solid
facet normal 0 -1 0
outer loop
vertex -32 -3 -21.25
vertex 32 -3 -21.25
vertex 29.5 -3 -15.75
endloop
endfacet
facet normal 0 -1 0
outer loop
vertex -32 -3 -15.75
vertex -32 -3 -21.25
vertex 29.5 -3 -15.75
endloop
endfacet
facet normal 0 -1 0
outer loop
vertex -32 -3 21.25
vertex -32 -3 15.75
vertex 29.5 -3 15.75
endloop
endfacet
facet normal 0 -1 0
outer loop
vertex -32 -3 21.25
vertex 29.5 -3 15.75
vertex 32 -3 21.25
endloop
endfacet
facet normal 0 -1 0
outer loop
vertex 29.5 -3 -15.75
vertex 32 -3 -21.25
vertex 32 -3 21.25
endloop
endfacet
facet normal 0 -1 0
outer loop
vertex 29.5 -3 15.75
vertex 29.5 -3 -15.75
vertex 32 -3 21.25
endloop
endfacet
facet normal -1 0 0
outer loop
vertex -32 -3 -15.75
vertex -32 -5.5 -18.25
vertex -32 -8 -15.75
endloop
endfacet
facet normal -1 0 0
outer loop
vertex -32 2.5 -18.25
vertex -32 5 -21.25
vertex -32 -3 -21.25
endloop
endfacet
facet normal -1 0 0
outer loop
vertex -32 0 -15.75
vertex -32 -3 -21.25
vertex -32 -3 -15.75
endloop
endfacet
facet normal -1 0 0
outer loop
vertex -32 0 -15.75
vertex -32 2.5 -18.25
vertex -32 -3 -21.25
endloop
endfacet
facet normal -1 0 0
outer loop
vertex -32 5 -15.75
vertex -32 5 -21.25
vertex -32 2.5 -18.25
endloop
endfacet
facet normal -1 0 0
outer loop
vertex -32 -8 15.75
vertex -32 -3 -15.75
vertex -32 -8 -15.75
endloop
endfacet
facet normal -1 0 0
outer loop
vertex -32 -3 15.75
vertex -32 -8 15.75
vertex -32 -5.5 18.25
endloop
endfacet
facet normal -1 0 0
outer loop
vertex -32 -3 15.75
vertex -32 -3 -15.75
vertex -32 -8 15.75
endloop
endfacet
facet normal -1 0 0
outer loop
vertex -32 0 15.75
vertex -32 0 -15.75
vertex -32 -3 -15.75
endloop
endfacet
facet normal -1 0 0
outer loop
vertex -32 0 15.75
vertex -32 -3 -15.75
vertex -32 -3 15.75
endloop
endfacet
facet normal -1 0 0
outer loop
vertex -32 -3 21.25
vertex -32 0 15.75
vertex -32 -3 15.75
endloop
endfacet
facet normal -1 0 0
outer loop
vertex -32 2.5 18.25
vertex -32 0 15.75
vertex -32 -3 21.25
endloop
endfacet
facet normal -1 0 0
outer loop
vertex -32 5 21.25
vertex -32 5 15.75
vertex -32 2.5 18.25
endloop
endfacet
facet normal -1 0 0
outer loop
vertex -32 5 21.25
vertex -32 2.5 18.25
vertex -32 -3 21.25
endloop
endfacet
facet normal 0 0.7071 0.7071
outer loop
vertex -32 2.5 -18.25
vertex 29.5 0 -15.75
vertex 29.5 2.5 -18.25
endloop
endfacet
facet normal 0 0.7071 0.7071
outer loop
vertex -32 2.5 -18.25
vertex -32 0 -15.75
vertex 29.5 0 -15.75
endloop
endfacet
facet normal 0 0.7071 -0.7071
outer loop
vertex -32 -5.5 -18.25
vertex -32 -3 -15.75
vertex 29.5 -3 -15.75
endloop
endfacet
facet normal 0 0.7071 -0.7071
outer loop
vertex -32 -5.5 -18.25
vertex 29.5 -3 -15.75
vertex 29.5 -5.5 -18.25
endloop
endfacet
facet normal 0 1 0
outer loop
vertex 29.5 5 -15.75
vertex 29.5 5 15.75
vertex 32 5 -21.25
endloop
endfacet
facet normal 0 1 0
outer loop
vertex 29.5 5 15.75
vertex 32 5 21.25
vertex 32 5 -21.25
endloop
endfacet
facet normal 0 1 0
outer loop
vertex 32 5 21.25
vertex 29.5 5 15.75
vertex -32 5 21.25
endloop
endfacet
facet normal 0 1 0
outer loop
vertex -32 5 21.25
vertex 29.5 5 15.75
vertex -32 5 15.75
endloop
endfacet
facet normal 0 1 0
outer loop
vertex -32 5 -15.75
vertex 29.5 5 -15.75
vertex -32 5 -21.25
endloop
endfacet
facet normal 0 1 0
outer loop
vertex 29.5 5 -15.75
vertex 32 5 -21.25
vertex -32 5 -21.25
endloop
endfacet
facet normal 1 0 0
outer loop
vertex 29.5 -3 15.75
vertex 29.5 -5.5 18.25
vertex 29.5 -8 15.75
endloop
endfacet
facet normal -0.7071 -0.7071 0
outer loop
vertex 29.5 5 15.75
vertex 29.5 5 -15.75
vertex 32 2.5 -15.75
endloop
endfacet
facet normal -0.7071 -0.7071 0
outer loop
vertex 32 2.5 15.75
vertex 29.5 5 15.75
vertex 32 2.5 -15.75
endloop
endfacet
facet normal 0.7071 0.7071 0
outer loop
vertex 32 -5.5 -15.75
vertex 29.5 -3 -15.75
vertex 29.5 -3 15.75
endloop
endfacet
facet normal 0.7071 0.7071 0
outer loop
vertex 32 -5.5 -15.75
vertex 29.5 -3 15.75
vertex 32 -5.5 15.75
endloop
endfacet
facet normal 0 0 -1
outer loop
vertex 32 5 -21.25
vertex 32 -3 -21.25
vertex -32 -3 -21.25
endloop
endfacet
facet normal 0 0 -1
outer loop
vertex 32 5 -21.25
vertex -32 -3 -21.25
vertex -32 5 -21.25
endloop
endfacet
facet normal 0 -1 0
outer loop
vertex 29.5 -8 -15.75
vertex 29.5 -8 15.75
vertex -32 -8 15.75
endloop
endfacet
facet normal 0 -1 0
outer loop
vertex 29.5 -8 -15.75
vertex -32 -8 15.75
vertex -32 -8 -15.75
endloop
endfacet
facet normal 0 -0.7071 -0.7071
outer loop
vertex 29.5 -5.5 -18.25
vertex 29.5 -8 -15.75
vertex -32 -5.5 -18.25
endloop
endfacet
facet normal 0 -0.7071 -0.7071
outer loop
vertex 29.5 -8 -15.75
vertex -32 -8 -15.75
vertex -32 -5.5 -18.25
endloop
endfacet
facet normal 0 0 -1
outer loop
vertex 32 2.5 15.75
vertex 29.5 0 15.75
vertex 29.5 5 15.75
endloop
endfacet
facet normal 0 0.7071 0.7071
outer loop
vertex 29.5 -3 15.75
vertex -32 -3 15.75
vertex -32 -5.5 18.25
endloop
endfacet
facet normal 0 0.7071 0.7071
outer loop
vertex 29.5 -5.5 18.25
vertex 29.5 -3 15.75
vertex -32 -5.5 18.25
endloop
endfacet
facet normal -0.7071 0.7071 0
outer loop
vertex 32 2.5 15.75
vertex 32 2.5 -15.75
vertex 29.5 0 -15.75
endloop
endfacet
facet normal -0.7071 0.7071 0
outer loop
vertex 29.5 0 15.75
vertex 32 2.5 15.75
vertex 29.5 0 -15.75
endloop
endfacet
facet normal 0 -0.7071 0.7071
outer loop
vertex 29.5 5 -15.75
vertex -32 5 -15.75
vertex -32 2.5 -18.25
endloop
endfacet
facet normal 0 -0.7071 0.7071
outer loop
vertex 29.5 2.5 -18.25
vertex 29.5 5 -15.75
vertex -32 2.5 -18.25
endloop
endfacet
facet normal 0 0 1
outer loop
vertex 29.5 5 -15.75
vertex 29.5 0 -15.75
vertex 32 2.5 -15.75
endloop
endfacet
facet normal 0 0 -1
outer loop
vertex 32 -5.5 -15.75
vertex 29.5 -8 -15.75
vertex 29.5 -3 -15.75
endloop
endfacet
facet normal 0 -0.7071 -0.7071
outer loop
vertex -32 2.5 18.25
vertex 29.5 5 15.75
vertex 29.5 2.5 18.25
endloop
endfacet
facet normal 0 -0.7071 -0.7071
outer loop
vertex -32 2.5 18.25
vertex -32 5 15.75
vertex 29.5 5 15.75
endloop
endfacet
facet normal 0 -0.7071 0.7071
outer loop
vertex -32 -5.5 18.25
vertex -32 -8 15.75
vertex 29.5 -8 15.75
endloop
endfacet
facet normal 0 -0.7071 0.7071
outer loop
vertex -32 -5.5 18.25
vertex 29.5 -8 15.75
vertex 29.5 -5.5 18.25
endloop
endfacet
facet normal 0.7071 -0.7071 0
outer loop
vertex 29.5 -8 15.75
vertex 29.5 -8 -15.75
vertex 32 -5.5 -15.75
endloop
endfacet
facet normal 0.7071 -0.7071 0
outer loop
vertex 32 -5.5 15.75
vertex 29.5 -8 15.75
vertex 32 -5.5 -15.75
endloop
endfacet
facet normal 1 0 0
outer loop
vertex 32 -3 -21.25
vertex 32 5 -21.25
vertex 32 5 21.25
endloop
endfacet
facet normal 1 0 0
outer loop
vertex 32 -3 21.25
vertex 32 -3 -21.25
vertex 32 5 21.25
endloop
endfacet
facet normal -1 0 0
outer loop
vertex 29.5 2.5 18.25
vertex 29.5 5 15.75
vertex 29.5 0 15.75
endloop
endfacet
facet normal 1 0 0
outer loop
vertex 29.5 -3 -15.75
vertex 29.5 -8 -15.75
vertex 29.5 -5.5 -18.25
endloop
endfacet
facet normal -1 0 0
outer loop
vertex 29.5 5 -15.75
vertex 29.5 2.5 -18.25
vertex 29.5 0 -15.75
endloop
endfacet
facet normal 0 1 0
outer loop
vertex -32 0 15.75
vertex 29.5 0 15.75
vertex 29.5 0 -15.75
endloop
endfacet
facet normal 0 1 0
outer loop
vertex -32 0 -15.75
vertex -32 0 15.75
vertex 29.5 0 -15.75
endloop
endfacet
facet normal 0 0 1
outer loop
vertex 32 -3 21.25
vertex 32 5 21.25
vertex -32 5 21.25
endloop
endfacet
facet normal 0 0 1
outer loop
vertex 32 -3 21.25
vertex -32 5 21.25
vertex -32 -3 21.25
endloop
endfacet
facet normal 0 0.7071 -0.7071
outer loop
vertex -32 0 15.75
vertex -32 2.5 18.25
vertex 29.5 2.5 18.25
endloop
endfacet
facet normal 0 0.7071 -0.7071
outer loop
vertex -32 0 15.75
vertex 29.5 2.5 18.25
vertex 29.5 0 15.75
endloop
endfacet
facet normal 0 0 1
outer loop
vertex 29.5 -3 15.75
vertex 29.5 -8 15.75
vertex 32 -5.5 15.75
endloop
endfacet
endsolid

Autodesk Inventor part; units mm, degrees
ref_plane "YZ Plane" through (0, 0, 0) normal (1, 0, 0) x (0, 1, 0)
ref_plane "XZ Plane" through (0, 0, 0) normal (0, 1, 0) x (-1, 0, 0)
sketch "Sketch5" plane through (0, 0, 0) normal (0, 0, 1) x (1, 0, 0)
  line L0 (-32, -5) -> (32, -5)
  line L1 (32, -5) -> (32, 5)
  line L2 (32, 5) -> (-32, 5)
  line L3 (-32, 5) -> (-32, -5)
  line L4 (-32, -5) -> (32, 5) construction
  line L5 (32, -5) -> (-32, 5) construction
  point P0 (0, 0)
  dimension "d17" = 64
  dimension "d18" = 10
extrude "Extrusion5" add sketch "Sketch5" along normal mid plane 46.5
ref_plane "Work Plane2" through (0, 0, 15.75) normal (0, 0, 1) x (1, 0, 0)
sketch "Sketch7" plane through (0, 0, 15.75) normal (0, 0, 1) x (1, 0, 0)
  line L0 (32, 5) -> (-32, 5) projected
  line L1 (-32, 5) -> (-32, -5) projected
  line L2 (-32, -5) -> (32, -5) projected
  line L3 (32, -5) -> (32, 5) projected
  line L4 (32, -5) -> (32, 5) projected
  line L5 (-32, -5) -> (32, -5) projected
  line L6 (32, 5) -> (-32, 5) projected
  line L7 (29.5, 5) -> (29.5, 0)
  line L8 (29.5, 5) -> (32, 2.5)
  line L9 (32, 2.5) -> (29.5, 0)
  point P0 (0, 0)
extrude "Extrusion6" cut sketch "Sketch7" against normal blind 31.5 contours L8 L9 L7
sketch "Sketch8" plane through (-32, -5, 23.25) normal (-1, 0, 0) x (0, 0, 1)
  line L0 (-46.5, 10) -> (0, 10) projected
  line L1 (-46.5, 10) -> (-41.5, 10)
  line L2 (-41.5, 0) -> (-46.5, 0)
  line L3 (-46.5, 5) -> (-46.5, 10)
  line L4 (0, 10) -> (-5, 10)
  line L5 (-46.5, 0) -> (-46.5, 10) projected
  line L6 (-41.5, 10) -> (-39, 10)
  line L7 (-39, 10) -> (-41.5, 7.5)
  line L8 (-39, 7.5) -> (-39, 5) projected
  line L9 (-39, 5) -> (-41.5, 7.5)
  line L10 (-5, 10) -> (-7.5, 10)
  line L11 (-7.5, 10) -> (-5, 7.5)
  line L12 (-7.5, 5) -> (-7.5, 7.5) projected
  line L13 (-5, 7.5) -> (-7.5, 5)
  line L14 (-7.5, 5) -> (-39, 5)
  line L15 (-39, 10) -> (-39, 7.5) projected
  line L16 (-7.5, 7.5) -> (-7.5, 10) projected
  line L17 (-39, 10) -> (-7.5, 10)
  line L18 (-39, 10) -> (-7.5, 10)
  line L19 (-7.5, 5) -> (-39, 5) projected
  line L20 (-39, 5) -> (-7.5, 5)
  point P0 (-23.25, 5)
extrude "Extrusion8" cut sketch "Sketch8" against normal blind 61.5
sketch "Sketch9" plane through (-32, -5, -23.25) normal (-1, 0, 0) x (0, 0, 1)
  line L0 (0, 10) -> (46.5, 10) projected
  line L1 (0, 10) -> (2, 10)
  line L2 (2, 10) -> (2, 0)
  line L3 (2, 0) -> (0, 0)
  line L4 (0, 0) -> (0, 10)
  line L5 (46.5, 10) -> (44.5, 10)
  line L6 (44.5, 10) -> (44.5, 0)
  line L7 (44.5, 0) -> (46.5, 0)
  line L8 (46.5, 0) -> (46.5, 10)
  point P0 (23.25, 5)
  dimension "d37" = 2
  dimension "d38" = 2
extrude "Extrusion9" cut sketch "Sketch9" against normal through all
sketch "Sketch10" plane through (-32, 0, -15.75) normal (-1, 0, 0) x (0, 0, 1)
  line L0 (-5.5, -5) -> (-5.5, 5) projected
  line L1 (37, 5) -> (37, -5) projected
  line L2 (-5.5, -5) -> (37, -5)
  line L3 (37, -5) -> (37, -8)
  line L4 (37, -8) -> (-5.5, -8)
  line L5 (-5.5, -8) -> (-5.5, -5)
  point P0 (15.75, 0)
  dimension "d70" = 3
sketch "Sketch12" plane through (-32, 0, -15.75) normal (-1, 0, 0) x (0, 0, 1)
  line L0 (37, -3) -> (42, -3)
  line L1 (42, -3) -> (42, 5)
  line L2 (42, 5) -> (37, 5)
  line L3 (37, 5) -> (37, -3)
  point P0 (15.75, 0)
  dimension "d56" = 5
  dimension "d59" = 8
revolve "Revolution1" [suppressed]
sketch "Sketch13" plane through (-32, -3, 21.25) normal (-1, 0, 0) x (0, 0, 1)
  line L0 (5, 8) -> (0, 8) projected
  line L1 (0, 8) -> (0, 0) projected
  line L2 (0, 0) -> (5, 0) projected
  line L3 (5, 0) -> (5, 8) projected
  line L4 (5, 0) -> (5, 8) projected
  line L5 (5, 4) -> (4, 4)
  point P0 (-21.25, 3)
  dimension "d58" = 1
feature "Snap Fit2" [suppressed]
mirror "Mirror1" [suppressed]
extrude "Extrusion11" add sketch "Sketch10" against normal blind 64
sketch "Sketch14" plane through (-32, 0, -15.75) normal (-1, 0, 0) x (0, 0, 1)
  line L0 (37, -8) -> (37, 5) projected
  line L1 (31.5, 5) -> (37, 5) projected
  line L2 (31.5, 5) -> (34, 2.5) projected
  line L3 (34, 2.5) -> (31.5, 0) projected
  line L4 (31.5, 0) -> (0, 0) projected
  line L5 (0, 0) -> (-2.5, 2.5) projected
  line L6 (-2.5, 2.5) -> (0, 5) projected
  line L7 (-5.5, 5) -> (0, 5) projected
  line L8 (-5.5, 5) -> (-5.5, -8) projected
  line L9 (-5.5, -8) -> (37, -8) projected
  line L10 (-5.5, -8) -> (37, -8) projected
  line L11 (0, -3) -> (-2.5, -5.5)
  line L12 (0, -8) -> (-2.5, -5.5)
  line L13 (0, -8) -> (-5.5, -8)
  line L14 (-5.5, 5) -> (-5.5, -8) projected
  line L15 (-5.5, 0) -> (-5, 0)
  line L16 (-5.5, -3) -> (-5.5, -8)
  line L17 (31.5, -3) -> (34, -5.5)
  line L18 (31.5, -8) -> (34, -5.5)
  line L19 (31.5, -8) -> (37, -8)
  line L20 (37, -3) -> (37, -8)
  line L21 (0, -3) -> (-5.5, -3)
  line L22 (31.5, -3) -> (37, -3)
  line L23 (37, -8) -> (37, 5) projected
  point P0 (15.75, 0)
extrude "Extrusion12" cut sketch "Sketch14" against normal blind 61.5 contours L9 L18 L17 L22 L0 | L9 L8 L21 L11 L12
sketch "Sketch15" plane through (32, 5, 21.25) normal (1, 0, 0) x (0, 0, -1)
  line L0 (0, -13) -> (42.5, -13) projected
  line L1 (0, -13) -> (5.5, -13)
  line L2 (5.5, -13) -> (5.5, -8)
  line L3 (5.5, -8) -> (0, -8)
  line L4 (0, -8) -> (0, -13)
  line L5 (42.5, -13) -> (42.5, -8) projected
  line L6 (42.5, -13) -> (37, -13)
  line L7 (37, -13) -> (37, -8)
  line L8 (37, -8) -> (42.5, -8)
  line L9 (42.5, -8) -> (42.5, -13)
  point P0 (21.25, -5)
  dimension "d76" = 5.5
  dimension "d77" = 5
  dimension "d78" = 5.5
  dimension "d79" = 5
extrude "Extrusion13" cut sketch "Sketch15" against normal blind 2.5
sketch "Sketch16" plane through (32, -8, 15.75) normal (0, 0, 1) x (1, 0, 0)
  line L0 (-2.5, 5) -> (-2.5, 2.5) projected
  line L1 (-2.5, 5) -> (0, 2.5)
  line L2 (0, 0) -> (0, 5) projected
  line L3 (-64, 0) -> (-2.5, 0) projected
  line L4 (-2.5, 0) -> (0, 2.5)
  line L5 (0, 5) -> (-64, 5) projected
  line L6 (-2.5, 5) -> (0, 5)
  line L7 (0, 5) -> (0, 0)
  line L8 (0, 0) -> (-2.5, 0)
  point P0 (-32, 8)
extrude "Extrusion14" cut sketch "Sketch16" against normal through all
properties part number "Enclosure-Bottom"
